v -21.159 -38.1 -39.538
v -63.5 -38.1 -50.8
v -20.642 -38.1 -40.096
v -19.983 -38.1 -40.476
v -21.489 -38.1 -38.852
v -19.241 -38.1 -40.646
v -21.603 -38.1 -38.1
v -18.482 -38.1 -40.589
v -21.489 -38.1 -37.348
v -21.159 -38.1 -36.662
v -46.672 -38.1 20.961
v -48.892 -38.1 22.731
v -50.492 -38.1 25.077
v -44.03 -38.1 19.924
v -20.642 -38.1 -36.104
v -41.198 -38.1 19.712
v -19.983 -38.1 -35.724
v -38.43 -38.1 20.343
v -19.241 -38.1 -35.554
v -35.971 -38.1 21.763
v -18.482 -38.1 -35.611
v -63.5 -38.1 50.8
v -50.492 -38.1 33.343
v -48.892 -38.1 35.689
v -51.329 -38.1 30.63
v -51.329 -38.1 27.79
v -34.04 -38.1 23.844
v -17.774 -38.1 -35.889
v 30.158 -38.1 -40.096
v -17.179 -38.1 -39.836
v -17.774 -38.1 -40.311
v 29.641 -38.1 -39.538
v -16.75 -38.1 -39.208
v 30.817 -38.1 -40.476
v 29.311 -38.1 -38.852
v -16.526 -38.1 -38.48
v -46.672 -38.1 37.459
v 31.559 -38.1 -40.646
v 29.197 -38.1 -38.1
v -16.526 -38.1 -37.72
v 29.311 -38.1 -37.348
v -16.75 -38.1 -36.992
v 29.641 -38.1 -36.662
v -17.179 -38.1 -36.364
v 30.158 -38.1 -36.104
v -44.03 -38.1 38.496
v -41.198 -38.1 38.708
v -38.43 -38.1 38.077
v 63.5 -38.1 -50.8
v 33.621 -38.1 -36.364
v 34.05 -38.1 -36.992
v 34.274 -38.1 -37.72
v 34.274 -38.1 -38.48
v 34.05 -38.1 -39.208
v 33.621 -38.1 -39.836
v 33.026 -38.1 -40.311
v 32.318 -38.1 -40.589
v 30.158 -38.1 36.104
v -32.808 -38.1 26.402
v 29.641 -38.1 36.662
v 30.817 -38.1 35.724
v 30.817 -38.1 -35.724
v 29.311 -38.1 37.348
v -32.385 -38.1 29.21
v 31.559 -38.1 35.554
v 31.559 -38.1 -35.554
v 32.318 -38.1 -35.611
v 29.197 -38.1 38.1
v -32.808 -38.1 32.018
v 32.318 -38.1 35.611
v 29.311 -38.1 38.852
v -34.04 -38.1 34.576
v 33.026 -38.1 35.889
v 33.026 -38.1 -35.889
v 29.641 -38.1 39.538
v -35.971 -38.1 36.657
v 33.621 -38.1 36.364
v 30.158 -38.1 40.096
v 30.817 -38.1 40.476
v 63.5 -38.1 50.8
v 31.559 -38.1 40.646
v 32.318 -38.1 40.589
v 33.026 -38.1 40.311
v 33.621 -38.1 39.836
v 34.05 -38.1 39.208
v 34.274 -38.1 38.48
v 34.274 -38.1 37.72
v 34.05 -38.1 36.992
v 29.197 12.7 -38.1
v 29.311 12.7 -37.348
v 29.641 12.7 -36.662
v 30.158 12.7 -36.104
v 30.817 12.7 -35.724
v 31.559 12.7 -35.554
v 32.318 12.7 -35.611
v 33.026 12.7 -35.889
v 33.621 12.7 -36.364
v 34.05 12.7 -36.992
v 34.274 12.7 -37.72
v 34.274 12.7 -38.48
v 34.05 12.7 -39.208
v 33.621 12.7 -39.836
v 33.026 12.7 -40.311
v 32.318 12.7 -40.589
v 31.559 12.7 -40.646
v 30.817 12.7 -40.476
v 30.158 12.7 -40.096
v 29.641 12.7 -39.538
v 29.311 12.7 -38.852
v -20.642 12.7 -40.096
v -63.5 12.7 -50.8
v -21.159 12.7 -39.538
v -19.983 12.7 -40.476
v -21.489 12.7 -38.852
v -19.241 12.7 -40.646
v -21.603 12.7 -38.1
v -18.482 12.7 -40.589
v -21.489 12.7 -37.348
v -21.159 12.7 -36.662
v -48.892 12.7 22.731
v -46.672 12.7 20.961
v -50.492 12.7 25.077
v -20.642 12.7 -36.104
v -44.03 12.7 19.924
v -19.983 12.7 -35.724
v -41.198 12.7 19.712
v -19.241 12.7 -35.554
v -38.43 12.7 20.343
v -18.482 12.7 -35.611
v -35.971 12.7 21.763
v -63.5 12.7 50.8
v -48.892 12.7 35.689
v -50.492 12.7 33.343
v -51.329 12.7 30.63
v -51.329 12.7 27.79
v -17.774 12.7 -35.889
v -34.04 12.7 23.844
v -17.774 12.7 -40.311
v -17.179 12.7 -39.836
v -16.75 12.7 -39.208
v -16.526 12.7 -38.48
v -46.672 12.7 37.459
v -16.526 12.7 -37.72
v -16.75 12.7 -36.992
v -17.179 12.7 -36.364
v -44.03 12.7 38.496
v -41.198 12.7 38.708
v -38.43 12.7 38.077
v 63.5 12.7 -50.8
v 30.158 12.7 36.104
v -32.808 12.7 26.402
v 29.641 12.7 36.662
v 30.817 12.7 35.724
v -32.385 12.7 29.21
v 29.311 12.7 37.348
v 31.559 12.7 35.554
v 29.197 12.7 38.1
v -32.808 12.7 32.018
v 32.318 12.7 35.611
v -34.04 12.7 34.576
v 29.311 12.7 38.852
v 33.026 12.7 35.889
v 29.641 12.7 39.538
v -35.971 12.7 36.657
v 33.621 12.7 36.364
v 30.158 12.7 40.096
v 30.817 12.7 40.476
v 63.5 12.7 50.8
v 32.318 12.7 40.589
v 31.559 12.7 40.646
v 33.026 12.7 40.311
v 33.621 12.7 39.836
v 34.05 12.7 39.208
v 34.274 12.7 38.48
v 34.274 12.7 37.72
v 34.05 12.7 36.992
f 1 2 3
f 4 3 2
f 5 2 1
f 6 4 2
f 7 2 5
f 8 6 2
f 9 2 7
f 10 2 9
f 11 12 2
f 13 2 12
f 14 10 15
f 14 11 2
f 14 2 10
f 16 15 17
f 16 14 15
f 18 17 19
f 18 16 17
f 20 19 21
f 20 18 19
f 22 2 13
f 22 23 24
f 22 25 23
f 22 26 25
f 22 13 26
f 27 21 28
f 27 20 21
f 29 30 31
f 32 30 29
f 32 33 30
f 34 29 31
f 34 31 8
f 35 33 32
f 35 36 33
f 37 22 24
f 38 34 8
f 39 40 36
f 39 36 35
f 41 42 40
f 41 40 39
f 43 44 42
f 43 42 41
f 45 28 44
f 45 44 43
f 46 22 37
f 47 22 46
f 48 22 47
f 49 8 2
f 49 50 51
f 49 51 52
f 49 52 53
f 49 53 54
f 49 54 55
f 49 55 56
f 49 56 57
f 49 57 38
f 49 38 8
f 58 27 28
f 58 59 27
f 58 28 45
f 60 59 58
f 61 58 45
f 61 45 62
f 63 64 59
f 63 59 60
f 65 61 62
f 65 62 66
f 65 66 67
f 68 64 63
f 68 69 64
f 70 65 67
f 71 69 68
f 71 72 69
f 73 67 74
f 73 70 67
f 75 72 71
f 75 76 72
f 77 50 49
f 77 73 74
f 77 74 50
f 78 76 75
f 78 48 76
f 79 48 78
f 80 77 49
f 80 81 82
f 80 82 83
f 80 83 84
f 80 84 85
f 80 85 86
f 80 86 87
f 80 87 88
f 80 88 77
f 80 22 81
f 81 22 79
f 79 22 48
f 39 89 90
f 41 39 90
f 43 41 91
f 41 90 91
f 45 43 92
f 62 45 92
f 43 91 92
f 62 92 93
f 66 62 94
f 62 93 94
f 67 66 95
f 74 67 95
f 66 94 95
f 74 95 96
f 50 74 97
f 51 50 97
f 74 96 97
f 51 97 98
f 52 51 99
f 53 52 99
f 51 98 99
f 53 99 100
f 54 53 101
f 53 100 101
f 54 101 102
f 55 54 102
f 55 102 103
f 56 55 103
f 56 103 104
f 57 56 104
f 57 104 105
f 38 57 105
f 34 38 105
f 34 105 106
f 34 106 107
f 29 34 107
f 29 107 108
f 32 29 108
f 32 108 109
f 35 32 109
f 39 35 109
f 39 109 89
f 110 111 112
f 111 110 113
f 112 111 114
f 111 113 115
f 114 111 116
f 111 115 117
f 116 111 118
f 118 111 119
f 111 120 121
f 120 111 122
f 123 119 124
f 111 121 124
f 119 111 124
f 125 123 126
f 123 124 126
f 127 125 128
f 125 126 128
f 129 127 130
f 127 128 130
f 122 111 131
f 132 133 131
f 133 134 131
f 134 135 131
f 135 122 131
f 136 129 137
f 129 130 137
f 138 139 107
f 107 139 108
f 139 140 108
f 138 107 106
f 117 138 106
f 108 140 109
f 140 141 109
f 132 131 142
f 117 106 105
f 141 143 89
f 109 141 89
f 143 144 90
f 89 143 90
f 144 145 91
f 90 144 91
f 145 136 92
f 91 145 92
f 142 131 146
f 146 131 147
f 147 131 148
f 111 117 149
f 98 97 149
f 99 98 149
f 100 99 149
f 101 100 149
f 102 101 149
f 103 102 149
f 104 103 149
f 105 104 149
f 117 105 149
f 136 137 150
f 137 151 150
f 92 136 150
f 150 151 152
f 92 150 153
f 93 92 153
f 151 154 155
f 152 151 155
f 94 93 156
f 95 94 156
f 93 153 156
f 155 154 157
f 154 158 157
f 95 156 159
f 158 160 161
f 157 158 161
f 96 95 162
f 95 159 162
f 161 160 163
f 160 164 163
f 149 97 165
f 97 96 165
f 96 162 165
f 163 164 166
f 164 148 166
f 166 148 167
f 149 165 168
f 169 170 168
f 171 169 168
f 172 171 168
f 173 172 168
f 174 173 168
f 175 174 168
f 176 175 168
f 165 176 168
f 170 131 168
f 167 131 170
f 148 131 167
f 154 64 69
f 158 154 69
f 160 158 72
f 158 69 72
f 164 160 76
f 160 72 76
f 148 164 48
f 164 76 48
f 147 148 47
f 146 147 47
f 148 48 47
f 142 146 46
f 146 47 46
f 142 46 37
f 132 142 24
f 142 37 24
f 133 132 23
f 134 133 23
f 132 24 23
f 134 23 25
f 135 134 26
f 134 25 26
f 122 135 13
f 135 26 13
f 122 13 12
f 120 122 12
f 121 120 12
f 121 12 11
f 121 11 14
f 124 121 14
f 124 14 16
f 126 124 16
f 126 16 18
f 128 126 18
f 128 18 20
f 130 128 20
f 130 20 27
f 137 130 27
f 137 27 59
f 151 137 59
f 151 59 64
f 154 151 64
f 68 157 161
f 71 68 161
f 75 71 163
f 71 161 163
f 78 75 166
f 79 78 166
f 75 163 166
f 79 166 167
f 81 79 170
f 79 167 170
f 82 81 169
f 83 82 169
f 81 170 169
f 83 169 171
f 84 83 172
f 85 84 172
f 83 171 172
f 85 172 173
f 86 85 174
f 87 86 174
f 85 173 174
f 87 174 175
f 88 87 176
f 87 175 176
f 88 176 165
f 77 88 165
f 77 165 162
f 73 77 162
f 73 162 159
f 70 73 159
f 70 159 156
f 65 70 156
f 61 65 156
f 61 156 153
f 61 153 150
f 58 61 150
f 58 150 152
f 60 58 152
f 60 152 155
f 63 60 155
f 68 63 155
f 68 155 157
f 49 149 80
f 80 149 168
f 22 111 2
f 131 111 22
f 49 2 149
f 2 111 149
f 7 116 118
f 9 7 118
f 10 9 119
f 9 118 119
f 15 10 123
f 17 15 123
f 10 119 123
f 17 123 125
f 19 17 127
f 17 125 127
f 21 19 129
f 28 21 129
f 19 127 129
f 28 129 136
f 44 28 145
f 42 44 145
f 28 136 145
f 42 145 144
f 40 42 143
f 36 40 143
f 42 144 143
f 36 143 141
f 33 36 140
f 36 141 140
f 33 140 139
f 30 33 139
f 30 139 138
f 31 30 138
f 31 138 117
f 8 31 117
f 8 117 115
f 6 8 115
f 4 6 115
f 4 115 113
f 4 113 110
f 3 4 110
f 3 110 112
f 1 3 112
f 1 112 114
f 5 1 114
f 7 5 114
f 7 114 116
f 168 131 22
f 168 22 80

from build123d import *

# Parameters (mm, degrees)
F0_W     = 127
F0_H     = 101.6
F1_DEPTH = 12.7
F2_DEPTH = 25.4
F3_R     = 9.525
F4_DEPTH = 50.801
F6_D     = 5.1054


with BuildPart() as f1:
    # F0 (on Front) → F1 (new body, symmetric)
    with BuildSketch(Plane.XZ):
        Rectangle(F0_W, F0_H)
    extrude(amount=F1_DEPTH, both=True)

    # F2 (add): a face of the model
    f2_faces = [f1.faces().sort_by_distance(p)[0] for p in [
        (0, -12.7, 0),
    ]]
    extrude(f2_faces, amount=F2_DEPTH)

    # F3 (on face) → F4 (cut, through all)
    with BuildSketch(Plane.XZ.offset(38.1)):
        with Locations((-41.91, 29.21)):
            Circle(F3_R)
    extrude(amount=-F4_DEPTH, mode=Mode.SUBTRACT)

    # F6 (through all)
    with Locations(Plane.XZ.offset(38.1)):
        with Locations((31.75, 38.1), (31.75, -38.1), (-19.05, -38.1)):
            Hole(F6_D / 2)


solid = f1.part
